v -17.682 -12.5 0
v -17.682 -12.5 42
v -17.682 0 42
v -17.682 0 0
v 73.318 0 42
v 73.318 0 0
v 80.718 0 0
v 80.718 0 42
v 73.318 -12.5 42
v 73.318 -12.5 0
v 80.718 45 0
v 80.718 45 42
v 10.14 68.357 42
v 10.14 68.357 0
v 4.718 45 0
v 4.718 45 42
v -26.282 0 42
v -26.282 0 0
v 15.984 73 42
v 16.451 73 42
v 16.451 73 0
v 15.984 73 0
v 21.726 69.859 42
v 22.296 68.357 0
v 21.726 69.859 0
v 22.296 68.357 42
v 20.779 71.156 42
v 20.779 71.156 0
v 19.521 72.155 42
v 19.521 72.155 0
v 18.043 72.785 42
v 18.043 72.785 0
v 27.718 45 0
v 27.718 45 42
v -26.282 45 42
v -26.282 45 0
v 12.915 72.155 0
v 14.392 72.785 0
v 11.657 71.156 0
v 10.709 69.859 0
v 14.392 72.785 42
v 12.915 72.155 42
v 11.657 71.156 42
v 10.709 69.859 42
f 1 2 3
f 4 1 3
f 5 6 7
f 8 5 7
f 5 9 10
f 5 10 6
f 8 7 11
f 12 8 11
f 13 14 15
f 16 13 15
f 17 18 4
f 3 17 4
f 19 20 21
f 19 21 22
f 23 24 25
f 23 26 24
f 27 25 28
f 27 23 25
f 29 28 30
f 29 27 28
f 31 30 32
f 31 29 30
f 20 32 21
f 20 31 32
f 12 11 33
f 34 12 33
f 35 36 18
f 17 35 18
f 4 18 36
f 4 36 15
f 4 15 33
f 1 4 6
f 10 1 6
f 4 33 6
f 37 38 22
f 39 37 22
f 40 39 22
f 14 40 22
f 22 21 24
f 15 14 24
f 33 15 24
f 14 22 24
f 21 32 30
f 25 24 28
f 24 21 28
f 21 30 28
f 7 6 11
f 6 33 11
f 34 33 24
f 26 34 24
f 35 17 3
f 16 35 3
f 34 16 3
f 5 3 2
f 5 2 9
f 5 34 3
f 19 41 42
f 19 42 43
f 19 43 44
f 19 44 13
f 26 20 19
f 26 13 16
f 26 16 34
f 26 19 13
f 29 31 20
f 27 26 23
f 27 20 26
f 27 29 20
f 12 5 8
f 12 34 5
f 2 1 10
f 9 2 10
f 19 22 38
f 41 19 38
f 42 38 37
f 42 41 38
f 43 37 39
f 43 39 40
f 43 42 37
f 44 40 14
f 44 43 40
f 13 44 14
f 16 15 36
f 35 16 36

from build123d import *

# Parameters (mm, degrees)
F0_W     = 91
F0_H     = 12.5
F1_DEPTH = 42
F2_R     = 6


with BuildPart() as f1:
    # F0 (on Top) → F1 (new body)
    with BuildSketch(Plane.XY):
        Polygon((-26.282259, 45), (-26.282259, 0), (-17.682259, 0), (73.317741, 0), (80.717741, 0), (80.717741, 45), (27.717741, 45), (4.717741, 45), align=None)
        with Locations((27.817741, -6.25)):
            Rectangle(F0_W, F0_H)
        Polygon((11.217741, 73), (4.717741, 45), (27.717741, 45), (21.217741, 73), align=None)
    extrude(amount=F1_DEPTH)

    # F2
    f2_edges = [f1.edges().sort_by_distance(p)[0] for p in [
        (11.217741, 73, 21),
        (21.217741, 73, 21),
    ]]
    fillet(f2_edges, radius=F2_R)


solid = f1.part
